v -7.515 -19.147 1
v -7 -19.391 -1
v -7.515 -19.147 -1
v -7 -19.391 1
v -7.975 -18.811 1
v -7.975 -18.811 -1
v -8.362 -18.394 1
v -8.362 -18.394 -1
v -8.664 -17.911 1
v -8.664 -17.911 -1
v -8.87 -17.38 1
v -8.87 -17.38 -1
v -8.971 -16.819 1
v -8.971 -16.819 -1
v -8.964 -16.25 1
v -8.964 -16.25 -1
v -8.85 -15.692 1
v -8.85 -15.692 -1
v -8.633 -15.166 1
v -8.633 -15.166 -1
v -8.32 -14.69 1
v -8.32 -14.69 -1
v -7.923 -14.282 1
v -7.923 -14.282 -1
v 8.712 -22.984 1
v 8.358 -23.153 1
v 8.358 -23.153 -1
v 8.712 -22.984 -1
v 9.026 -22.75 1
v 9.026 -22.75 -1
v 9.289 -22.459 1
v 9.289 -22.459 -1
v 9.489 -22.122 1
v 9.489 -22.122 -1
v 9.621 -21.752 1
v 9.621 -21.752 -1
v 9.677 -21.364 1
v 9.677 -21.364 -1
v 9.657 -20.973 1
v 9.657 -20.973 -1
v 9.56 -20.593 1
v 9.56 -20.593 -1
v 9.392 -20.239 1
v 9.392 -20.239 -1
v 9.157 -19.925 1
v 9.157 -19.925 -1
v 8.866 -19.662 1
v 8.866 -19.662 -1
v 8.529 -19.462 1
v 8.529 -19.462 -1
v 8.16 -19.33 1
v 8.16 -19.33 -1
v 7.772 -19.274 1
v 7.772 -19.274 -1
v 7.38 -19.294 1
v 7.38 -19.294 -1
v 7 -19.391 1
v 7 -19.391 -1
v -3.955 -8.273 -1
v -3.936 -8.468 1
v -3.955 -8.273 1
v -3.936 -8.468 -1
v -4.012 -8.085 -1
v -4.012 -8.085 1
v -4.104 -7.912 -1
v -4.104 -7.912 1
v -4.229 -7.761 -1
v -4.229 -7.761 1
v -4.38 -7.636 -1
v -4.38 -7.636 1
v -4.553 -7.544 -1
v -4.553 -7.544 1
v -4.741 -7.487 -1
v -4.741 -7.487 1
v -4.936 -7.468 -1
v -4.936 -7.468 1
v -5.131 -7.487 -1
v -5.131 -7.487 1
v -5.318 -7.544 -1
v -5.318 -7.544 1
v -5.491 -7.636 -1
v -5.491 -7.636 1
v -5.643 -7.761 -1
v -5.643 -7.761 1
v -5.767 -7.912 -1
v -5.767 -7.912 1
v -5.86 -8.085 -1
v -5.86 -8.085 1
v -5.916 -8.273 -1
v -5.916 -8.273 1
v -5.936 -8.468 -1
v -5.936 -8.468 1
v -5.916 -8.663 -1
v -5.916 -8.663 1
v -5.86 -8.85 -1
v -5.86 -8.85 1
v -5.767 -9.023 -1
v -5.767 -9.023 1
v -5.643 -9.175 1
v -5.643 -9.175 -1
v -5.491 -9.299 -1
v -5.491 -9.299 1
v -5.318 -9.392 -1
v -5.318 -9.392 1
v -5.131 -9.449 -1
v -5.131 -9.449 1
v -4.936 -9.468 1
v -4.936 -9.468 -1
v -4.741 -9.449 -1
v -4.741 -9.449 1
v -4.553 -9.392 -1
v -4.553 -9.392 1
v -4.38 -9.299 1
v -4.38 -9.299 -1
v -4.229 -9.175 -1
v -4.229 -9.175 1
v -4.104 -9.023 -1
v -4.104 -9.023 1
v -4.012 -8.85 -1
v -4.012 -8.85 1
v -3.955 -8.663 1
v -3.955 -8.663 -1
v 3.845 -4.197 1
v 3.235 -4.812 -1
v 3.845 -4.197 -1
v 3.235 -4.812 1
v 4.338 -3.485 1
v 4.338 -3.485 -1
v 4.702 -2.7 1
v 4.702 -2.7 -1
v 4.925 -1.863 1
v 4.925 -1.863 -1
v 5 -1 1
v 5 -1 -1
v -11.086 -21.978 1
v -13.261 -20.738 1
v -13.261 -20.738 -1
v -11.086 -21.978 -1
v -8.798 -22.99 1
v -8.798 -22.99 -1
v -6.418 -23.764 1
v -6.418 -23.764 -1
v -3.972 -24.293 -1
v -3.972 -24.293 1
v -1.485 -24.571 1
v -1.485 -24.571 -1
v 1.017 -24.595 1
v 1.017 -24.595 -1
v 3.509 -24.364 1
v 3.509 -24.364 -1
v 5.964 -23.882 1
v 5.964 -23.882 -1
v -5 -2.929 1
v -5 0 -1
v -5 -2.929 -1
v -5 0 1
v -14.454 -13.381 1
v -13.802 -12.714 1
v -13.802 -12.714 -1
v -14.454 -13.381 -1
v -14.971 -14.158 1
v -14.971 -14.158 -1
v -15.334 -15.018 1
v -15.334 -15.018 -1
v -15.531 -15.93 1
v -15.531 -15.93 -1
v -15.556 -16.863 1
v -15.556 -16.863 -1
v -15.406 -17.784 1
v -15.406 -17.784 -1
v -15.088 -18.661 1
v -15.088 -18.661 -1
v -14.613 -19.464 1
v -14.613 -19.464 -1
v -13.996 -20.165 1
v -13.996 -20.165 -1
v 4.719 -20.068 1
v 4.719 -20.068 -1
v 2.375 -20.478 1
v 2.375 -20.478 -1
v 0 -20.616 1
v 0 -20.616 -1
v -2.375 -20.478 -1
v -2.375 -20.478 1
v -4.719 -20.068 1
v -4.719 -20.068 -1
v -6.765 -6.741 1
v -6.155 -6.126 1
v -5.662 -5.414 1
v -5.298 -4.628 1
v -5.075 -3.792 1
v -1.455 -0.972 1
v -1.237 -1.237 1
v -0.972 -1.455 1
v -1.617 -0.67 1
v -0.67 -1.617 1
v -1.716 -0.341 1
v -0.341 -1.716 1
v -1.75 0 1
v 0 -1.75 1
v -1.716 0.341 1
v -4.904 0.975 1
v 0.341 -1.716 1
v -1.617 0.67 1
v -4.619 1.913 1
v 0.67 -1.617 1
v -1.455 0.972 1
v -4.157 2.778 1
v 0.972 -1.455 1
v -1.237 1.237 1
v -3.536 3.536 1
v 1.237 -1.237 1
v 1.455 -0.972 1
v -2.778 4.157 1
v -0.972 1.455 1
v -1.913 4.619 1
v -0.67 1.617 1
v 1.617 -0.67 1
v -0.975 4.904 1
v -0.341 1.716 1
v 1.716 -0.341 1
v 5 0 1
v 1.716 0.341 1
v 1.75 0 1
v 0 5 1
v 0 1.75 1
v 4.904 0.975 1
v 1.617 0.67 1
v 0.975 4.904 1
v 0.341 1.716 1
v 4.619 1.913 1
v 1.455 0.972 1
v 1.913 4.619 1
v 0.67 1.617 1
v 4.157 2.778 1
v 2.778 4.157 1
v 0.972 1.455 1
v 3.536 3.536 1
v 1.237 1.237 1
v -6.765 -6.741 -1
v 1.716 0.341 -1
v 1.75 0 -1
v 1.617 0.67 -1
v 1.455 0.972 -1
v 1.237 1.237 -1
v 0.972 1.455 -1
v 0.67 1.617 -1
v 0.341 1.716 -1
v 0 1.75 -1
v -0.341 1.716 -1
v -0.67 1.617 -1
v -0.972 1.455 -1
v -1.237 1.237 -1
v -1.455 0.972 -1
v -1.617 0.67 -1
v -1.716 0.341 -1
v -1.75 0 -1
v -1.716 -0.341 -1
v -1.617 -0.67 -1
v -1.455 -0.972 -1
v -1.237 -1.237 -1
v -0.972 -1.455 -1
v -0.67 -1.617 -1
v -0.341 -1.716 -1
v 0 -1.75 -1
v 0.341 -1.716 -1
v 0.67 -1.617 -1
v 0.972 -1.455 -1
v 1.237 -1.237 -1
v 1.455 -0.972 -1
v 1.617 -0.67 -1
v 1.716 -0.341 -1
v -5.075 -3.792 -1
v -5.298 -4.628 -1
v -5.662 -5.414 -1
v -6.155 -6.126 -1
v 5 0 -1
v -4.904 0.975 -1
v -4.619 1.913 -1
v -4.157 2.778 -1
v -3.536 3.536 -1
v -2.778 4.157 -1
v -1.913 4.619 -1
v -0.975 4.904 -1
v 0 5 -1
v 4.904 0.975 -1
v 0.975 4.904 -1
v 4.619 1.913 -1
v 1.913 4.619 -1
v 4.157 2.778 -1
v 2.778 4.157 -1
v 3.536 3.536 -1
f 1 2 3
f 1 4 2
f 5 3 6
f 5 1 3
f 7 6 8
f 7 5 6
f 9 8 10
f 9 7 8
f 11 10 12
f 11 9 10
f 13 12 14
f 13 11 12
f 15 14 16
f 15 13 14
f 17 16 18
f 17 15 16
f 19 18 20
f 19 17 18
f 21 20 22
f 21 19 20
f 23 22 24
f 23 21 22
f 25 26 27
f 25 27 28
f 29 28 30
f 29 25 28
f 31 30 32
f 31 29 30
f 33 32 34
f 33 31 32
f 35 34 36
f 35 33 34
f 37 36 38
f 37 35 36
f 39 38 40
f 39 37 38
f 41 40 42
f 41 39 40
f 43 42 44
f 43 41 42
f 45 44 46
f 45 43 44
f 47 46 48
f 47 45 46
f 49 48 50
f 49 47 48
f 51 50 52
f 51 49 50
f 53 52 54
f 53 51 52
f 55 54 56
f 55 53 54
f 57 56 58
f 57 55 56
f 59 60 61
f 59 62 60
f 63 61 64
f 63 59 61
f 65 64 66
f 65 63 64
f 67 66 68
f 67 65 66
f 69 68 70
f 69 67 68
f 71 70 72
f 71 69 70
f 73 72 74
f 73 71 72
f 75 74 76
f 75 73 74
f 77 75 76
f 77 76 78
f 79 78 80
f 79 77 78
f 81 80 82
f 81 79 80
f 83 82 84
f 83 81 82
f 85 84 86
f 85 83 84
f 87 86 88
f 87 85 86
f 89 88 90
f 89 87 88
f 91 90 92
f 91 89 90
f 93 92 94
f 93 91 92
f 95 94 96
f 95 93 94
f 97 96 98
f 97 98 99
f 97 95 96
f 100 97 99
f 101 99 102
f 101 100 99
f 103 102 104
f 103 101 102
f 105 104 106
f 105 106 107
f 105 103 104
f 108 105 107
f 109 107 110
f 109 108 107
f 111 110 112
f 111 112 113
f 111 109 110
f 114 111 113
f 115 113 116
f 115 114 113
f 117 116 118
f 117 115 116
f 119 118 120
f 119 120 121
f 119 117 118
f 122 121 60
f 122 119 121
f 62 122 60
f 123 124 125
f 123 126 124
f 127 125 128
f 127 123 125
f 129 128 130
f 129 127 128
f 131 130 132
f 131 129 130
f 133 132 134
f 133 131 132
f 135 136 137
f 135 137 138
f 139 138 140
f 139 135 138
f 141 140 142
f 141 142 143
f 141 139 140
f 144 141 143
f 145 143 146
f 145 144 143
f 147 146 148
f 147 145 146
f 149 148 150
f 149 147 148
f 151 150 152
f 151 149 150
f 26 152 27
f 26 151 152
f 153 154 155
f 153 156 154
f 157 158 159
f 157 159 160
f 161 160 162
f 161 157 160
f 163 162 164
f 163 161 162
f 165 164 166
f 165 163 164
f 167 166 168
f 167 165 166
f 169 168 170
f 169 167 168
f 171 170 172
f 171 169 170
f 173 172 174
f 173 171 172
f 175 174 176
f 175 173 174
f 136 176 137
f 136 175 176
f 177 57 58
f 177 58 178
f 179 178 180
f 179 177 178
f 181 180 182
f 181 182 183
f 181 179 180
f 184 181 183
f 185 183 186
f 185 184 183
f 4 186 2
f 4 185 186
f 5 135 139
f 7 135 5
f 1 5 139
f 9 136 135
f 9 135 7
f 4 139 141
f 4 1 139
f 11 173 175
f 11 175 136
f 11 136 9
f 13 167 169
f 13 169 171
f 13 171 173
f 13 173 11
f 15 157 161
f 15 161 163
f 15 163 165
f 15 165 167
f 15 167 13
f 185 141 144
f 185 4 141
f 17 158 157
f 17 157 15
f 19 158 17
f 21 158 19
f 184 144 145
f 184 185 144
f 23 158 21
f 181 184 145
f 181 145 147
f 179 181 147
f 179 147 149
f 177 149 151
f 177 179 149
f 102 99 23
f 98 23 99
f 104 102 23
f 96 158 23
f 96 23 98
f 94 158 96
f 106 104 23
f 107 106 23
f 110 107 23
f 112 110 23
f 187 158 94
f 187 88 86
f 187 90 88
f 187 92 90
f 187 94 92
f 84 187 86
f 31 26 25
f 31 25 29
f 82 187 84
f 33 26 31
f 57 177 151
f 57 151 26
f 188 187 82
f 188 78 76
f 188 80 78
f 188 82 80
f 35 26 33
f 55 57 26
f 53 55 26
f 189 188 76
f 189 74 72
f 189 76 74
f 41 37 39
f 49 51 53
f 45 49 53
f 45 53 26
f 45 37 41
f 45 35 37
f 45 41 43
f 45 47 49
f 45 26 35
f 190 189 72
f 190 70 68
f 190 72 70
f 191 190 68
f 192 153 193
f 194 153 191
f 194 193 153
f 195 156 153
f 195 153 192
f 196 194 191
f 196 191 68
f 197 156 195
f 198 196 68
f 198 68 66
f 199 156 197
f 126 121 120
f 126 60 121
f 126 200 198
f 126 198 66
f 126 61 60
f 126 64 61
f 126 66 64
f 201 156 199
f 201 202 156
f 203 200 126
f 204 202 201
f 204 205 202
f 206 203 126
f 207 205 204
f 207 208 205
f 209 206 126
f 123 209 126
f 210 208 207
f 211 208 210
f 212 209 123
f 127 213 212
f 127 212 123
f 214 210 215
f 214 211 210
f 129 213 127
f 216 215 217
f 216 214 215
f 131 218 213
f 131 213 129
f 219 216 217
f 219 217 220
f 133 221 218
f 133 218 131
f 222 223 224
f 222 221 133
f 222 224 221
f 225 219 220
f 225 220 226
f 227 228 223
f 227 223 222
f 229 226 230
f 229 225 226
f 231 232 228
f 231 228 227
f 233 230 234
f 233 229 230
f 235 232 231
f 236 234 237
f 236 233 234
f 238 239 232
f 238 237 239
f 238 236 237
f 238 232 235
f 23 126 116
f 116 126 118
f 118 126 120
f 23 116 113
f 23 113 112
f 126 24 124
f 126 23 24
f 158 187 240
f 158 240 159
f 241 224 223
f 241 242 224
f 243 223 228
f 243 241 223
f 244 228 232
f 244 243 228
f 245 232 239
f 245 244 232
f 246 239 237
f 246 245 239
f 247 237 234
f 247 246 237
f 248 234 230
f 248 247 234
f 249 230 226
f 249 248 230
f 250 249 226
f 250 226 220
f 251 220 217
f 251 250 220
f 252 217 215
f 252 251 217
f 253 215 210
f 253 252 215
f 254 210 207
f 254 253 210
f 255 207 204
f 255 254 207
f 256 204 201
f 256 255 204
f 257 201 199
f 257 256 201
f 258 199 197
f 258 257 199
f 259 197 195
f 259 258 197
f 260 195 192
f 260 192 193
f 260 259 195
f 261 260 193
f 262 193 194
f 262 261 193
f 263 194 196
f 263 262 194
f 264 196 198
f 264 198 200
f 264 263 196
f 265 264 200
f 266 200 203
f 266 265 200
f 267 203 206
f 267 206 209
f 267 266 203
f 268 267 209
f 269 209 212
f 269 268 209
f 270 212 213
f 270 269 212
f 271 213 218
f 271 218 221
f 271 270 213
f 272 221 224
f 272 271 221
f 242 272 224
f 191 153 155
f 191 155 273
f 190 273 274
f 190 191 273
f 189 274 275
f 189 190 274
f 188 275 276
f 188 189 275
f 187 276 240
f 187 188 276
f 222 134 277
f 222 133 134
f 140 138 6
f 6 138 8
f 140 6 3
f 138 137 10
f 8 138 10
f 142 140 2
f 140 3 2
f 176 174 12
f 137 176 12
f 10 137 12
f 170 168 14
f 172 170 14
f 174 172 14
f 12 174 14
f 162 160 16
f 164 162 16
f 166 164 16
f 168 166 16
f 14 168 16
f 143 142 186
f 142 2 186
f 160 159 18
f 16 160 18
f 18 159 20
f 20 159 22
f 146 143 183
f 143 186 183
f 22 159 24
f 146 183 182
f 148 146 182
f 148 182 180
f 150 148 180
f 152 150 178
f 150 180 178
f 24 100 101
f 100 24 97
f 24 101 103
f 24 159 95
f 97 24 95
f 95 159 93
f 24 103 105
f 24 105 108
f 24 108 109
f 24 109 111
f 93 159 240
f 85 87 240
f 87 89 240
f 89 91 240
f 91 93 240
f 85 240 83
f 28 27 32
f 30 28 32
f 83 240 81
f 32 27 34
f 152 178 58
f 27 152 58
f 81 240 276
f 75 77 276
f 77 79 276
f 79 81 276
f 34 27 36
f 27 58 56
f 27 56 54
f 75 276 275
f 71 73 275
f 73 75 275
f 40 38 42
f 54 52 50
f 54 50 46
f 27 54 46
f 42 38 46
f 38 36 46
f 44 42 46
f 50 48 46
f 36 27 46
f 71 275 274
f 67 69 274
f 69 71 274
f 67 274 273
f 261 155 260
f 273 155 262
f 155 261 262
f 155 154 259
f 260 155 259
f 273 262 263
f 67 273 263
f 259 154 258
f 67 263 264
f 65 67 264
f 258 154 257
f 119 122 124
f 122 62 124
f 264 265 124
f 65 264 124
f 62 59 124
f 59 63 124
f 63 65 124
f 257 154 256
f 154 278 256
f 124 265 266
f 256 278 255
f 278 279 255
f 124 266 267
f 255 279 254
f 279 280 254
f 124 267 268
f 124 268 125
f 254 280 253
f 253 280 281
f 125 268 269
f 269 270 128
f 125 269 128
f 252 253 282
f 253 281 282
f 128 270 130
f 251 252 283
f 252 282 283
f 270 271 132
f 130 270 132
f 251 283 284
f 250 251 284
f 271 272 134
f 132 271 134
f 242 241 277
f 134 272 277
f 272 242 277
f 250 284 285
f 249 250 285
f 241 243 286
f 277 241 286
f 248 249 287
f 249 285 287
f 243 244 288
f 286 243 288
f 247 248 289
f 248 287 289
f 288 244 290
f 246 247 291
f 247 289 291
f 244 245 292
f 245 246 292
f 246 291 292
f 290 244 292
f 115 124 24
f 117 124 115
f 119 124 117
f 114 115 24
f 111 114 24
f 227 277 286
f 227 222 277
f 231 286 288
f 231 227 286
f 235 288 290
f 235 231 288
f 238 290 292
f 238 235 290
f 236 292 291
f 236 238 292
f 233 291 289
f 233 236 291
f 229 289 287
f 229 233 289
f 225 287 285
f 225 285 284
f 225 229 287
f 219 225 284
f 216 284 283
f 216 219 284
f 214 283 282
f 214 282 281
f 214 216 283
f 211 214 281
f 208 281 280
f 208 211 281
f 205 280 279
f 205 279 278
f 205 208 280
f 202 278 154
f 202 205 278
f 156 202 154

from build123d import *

# Parameters (mm, degrees)
SKETCH1_R           = 1.75
SKETCH1_R_2         = 1
BOSS_EXTRUDE1_DEPTH = 1


with BuildPart() as part:
    # Sketch1 → Boss-Extrude1 (new, symmetric)
    with BuildSketch(Plane.XY):
        with BuildLine():
            Line((-5, 0), (-5, -2.928879346))
            ThreePointArc((-5, -2.928879346), (-5.462566041, -5.029282419), (-6.764677227, -6.741055438))
            Line((-6.764677227, -6.741055438), (-13.802331482, -12.713781389))
            ThreePointArc((-13.802331482, -12.713781389), (-15.555651524, -16.862770292), (-13.260540242, -20.738425628))
            ThreePointArc((-13.260540242, -20.738425628), (-2.732373515, -24.463408593), (8.3581995, -23.153071635))
            ThreePointArc((8.3581995, -23.153071635), (9.560275853, -20.592795782), (7, -19.39071943))
            ThreePointArc((7, -19.39071943), (0, -20.615528128), (-7, -19.39071943))
            ThreePointArc((-7, -19.39071943), (-8.933606572, -17.102043774), (-7.922544038, -14.28164962))
            Line((-7.922544038, -14.28164962), (3.235322773, -4.812176092))
            ThreePointArc((3.235322773, -4.812176092), (4.537433959, -3.100403073), (5, -1))
            Line((5, -1), (5, 0))
            ThreePointArc((5, 0), (0, 5), (-5, 0))
        make_face()
        Circle(SKETCH1_R, mode=Mode.SUBTRACT)
        with Locations((-4.935698975, -8.467802799)):
            Circle(SKETCH1_R_2, mode=Mode.SUBTRACT)
    extrude(amount=BOSS_EXTRUDE1_DEPTH, both=True)


solid = part.part
